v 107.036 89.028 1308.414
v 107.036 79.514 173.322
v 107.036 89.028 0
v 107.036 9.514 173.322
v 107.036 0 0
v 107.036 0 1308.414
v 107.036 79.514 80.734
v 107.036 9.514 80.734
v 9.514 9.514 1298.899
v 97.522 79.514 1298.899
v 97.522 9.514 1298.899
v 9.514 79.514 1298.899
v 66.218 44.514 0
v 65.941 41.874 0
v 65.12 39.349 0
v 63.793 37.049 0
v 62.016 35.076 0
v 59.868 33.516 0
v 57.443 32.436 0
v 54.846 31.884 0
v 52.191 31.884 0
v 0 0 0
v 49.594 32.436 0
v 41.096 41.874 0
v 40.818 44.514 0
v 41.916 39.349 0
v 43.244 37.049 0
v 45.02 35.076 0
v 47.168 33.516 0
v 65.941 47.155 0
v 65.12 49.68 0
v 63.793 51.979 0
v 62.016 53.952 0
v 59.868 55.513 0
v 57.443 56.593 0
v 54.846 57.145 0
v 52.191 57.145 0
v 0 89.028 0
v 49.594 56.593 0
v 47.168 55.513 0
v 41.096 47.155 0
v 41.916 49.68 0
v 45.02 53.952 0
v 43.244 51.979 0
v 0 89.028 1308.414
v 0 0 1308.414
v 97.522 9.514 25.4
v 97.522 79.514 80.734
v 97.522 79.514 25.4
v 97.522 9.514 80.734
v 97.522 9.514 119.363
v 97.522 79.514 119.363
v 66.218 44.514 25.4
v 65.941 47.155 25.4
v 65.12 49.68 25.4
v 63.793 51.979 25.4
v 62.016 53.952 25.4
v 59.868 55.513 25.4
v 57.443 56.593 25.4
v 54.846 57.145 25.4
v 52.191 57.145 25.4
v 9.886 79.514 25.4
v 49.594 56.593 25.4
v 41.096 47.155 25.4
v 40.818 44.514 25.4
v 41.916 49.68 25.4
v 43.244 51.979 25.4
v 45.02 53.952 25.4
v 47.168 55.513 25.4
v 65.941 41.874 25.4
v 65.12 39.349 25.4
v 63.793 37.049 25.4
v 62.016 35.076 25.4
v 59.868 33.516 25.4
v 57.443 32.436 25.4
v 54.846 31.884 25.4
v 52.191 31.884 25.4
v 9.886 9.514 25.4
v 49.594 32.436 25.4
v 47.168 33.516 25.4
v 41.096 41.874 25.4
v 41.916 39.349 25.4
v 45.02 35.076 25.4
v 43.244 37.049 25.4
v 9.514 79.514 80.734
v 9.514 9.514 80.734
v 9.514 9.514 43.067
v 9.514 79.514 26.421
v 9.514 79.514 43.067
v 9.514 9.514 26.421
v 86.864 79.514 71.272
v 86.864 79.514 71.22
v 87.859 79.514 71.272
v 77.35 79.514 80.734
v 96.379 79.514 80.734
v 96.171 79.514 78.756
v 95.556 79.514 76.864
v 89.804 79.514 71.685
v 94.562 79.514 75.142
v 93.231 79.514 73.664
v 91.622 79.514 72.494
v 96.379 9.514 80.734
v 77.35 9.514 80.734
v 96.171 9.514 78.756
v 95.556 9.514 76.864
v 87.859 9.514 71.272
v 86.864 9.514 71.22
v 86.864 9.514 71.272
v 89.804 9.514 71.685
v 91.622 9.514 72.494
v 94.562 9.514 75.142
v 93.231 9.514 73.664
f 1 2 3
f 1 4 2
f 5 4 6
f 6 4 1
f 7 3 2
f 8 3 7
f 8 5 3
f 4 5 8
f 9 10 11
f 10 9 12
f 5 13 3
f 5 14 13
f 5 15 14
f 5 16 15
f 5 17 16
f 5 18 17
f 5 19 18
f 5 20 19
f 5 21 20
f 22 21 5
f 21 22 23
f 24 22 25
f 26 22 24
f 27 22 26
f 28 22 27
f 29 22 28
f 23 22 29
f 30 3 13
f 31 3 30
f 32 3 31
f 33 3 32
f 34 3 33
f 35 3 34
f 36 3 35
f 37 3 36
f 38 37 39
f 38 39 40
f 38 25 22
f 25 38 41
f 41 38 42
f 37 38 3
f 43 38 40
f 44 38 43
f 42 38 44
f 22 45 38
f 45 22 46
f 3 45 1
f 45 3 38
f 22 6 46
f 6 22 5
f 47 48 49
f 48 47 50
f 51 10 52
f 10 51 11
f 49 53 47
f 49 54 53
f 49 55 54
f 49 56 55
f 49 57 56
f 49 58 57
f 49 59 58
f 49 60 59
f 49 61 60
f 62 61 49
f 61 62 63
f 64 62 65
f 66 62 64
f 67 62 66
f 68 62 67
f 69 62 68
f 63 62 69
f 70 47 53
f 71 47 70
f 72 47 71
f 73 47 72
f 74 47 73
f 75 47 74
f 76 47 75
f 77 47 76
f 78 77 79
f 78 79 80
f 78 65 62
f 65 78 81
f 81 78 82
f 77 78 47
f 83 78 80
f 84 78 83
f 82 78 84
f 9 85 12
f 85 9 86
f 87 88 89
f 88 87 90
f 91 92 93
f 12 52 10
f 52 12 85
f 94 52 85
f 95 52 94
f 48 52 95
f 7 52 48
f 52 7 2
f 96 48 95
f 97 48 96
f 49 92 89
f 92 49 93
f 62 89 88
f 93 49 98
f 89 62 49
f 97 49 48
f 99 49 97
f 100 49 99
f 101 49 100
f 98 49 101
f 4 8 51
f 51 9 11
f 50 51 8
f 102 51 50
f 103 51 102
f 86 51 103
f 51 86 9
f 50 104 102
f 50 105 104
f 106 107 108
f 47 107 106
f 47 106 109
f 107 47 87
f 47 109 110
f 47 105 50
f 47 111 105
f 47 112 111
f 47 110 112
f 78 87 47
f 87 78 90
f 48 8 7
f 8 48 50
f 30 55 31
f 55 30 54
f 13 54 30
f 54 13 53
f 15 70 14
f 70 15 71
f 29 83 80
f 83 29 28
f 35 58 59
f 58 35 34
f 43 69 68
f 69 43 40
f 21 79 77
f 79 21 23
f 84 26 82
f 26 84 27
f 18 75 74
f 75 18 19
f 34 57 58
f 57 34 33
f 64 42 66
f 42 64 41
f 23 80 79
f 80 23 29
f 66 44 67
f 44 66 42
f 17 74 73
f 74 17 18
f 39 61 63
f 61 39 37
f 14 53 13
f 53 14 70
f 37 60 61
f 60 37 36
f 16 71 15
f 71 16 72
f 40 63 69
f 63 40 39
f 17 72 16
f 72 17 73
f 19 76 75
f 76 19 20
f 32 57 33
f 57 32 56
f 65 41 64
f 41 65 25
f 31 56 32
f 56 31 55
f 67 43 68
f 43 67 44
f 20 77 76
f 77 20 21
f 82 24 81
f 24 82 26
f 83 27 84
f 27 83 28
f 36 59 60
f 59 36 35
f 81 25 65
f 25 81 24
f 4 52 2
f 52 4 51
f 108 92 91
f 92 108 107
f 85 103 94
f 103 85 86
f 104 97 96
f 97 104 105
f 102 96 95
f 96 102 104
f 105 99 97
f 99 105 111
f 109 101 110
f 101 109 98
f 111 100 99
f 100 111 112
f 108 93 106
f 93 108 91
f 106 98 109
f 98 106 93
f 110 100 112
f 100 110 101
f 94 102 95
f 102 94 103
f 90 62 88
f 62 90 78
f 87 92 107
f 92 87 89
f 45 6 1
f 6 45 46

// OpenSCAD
wall_thickness=9.51443150487179; //[0: 0.001 :10]
  cap_height=80.7342210117856; //[0: 0.001 :100]
  bottom_thickness=25.4; //[0: 0.01 :50]
  windsheet_thickness=1.143; //[0: 0.001 :5]
  mouth_height=38.6288075005913; //[0: 0.001 :50]
  pipe_size=25.4;  //[0: 0.001 :20]
  internal_width=69.9994008891596; //[0: 0.001 :100]
  internal_depth=88.0073018034369; //[0: 0.001 :100]
  internal_height=1218.16520083027; //[0: 0.001 :1000]
  mouth_angle=10;  //[0: 0.1 :90]
  windsheet_angle=20;  //[0: 0.1 :50]
  capped=1; //[1, 0]
  
  module pipe(wall_thickness, cap_height, bottom_thickness, windsheet_thickness, mouth_height, pipe_size, internal_width, internal_depth, internal_height, mouth_angle, windsheet_angle,capped);
  
  difference(){
  cube([(internal_depth+(2*wall_thickness)), (internal_width+(2*wall_thickness)), (internal_height+cap_height)]);
  translate([wall_thickness, wall_thickness, bottom_thickness]){
  cube([internal_depth, internal_width, (internal_height+cap_height-bottom_thickness+1)]);
  }
  translate([wall_thickness, wall_thickness, cap_height]){
  cube([(internal_depth+wall_thickness+1), internal_width, mouth_height]);
  }
  translate([((internal_depth+(2*wall_thickness))/2), ((internal_width+(2*wall_thickness))/2), -1]){
  cylinder(h=bottom_thickness+2, d=pipe_size, $fn=30);
  }
  translate([(internal_depth+wall_thickness), wall_thickness, (cap_height+mouth_height)]){
  rotate([0, mouth_angle, 0]){
  cube([wall_thickness, internal_width, internal_height]);
  }
  }
  }
  
  difference(){
  union(){
  translate([wall_thickness, wall_thickness, bottom_thickness]){
  cube([(internal_depth-windsheet_thickness-wall_thickness), internal_width, (cap_height-bottom_thickness)]);
  }
  translate([(internal_depth-windsheet_thickness), wall_thickness, cap_height]){
  rotate(a=-90, v=[1, 0, 0]){
  cylinder(h=internal_width, r=wall_thickness, $fn=30);
  }
  }
  }
  translate([(internal_depth-wall_thickness-windsheet_thickness), wall_thickness-1, cap_height]){
  cube([(2*wall_thickness), internal_width+2, mouth_height]);
  }
  translate([(internal_depth-windsheet_thickness), wall_thickness-1, (cap_height-wall_thickness)]){
  rotate(a=-windsheet_angle-180, v=[0, 1, 0]){
  cube([internal_depth, internal_width+2, cap_height]);
  }
  }
  }
  
  if(capped==1){
  translate([0, 0, (internal_height+cap_height)]){
  cube([(internal_depth+(2*wall_thickness)), (internal_width+(2*wall_thickness)), wall_thickness]);
  }
  }
